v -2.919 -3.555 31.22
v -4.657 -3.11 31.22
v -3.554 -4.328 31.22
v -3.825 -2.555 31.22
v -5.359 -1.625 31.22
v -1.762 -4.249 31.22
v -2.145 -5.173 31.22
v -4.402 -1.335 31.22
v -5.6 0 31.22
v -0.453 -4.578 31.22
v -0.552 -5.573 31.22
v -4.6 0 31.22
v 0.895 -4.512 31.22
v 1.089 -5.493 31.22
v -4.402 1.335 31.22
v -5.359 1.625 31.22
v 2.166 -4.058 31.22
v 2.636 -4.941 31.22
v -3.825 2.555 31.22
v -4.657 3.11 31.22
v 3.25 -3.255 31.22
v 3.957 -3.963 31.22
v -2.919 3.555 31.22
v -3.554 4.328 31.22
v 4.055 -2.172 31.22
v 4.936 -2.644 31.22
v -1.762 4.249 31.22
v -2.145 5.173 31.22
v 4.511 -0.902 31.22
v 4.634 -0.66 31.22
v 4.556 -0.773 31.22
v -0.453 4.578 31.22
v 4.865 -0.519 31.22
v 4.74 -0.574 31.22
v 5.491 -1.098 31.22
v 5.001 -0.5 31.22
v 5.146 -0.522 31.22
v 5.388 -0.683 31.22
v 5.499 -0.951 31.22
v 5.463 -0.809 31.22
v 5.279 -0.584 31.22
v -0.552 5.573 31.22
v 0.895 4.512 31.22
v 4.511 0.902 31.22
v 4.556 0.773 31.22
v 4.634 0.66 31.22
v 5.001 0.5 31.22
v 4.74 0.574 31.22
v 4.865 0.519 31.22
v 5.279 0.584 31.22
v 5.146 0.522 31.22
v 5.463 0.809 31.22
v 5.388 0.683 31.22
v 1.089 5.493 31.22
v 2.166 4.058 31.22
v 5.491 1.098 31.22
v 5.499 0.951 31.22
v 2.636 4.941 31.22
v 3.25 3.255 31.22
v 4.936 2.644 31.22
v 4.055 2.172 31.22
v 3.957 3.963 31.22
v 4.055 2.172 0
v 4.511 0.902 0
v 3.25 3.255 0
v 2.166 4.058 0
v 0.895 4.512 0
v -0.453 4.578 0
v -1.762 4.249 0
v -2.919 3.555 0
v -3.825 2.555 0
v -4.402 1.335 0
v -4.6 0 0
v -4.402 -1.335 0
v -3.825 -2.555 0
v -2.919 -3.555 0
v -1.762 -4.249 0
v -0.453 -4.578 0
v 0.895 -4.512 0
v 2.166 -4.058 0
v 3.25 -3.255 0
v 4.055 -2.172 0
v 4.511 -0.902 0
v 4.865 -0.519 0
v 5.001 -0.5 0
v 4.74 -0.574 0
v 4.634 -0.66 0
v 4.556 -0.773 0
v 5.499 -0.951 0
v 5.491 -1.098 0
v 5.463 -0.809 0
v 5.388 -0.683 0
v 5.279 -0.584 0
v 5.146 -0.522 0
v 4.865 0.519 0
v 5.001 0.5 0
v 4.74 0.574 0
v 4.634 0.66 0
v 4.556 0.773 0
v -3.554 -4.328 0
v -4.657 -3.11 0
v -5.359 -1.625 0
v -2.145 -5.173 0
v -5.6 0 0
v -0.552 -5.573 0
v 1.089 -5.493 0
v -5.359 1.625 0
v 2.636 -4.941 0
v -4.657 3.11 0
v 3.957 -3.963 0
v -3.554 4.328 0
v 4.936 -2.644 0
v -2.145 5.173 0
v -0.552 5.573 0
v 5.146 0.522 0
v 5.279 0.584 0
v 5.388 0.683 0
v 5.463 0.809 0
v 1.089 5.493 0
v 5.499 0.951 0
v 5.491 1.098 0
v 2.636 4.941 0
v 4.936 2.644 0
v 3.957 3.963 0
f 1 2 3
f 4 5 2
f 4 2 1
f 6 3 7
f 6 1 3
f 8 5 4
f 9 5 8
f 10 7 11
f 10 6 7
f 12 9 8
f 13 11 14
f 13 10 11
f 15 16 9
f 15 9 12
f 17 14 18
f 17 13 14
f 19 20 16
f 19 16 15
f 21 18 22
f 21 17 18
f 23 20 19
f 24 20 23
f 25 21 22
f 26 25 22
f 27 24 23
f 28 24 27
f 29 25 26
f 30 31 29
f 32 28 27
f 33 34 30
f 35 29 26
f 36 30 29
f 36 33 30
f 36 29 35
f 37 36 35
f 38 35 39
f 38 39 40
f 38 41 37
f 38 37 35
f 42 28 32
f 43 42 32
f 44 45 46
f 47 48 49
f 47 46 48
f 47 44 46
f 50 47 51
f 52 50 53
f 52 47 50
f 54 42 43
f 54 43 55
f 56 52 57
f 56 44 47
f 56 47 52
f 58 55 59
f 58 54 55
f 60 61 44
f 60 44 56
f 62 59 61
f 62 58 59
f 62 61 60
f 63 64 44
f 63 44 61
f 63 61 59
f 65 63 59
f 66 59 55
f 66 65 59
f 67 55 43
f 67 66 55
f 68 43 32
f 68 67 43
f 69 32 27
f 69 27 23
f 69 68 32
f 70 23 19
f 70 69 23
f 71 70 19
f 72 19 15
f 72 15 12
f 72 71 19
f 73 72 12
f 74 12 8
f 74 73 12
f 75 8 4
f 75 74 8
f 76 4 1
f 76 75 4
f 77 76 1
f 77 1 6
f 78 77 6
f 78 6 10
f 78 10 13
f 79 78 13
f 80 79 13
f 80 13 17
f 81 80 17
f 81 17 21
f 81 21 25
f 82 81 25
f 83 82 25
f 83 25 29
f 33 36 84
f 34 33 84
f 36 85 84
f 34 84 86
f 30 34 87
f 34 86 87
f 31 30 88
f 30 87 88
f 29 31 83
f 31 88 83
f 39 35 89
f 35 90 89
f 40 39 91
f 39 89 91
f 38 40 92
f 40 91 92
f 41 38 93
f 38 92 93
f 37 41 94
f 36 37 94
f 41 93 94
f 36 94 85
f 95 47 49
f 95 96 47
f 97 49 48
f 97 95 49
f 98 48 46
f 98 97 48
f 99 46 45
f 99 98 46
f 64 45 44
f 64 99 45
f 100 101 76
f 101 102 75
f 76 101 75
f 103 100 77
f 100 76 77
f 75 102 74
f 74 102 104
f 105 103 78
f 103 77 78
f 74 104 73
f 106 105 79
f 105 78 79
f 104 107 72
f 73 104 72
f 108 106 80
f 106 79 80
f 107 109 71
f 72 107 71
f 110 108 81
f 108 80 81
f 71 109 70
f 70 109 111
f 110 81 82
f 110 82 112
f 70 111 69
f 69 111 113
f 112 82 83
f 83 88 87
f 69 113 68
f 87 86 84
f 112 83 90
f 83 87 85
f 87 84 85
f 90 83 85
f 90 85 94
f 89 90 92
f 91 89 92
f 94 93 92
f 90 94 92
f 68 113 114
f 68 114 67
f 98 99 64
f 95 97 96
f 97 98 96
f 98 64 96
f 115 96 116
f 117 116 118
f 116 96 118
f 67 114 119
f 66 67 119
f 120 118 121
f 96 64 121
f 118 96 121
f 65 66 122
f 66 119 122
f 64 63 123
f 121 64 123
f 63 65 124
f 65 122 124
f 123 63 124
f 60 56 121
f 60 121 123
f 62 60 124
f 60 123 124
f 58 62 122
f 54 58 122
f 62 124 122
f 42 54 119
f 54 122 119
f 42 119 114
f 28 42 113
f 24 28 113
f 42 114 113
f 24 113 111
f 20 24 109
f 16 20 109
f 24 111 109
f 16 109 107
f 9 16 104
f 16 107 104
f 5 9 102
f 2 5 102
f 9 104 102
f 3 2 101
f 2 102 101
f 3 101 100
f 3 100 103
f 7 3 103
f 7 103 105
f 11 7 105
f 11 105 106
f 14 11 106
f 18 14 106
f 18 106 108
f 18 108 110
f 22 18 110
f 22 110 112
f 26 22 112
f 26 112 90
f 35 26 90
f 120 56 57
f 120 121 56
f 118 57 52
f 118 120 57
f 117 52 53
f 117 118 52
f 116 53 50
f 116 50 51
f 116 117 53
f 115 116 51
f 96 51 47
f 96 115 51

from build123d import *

# Parameters (mm, degrees)
SKETCH_1_R          = 5.6
SKETCH_1_R_2        = 4.6
EXTRUDE_1_DEPTH     = 31.22
SKETCH_2_W          = 4.086350381
SKETCH_2_H          = 1
CUT_EXTRUDE_1_DEPTH = 33.208824878
FILLET_1_R          = 0.5


with BuildPart() as part:
    # 스케치1 → 보스-돌출1 (new body)
    with BuildSketch(Plane.XY):
        Circle(SKETCH_1_R)
        Circle(SKETCH_1_R_2, mode=Mode.SUBTRACT)
    extrude(amount=EXTRUDE_1_DEPTH)

    # 스케치2 → 컷-돌출1 (cut, through all)
    with BuildSketch(Plane.XY):
        with Locations((5.169276946, 0)):
            Rectangle(SKETCH_2_W, SKETCH_2_H)
    extrude(amount=CUT_EXTRUDE_1_DEPTH, mode=Mode.SUBTRACT)

    # 필렛1
    fillet_1_edges = [part.edges().sort_by_distance(p)[0] for p in [
        (4.572745346, -0.5, 15.61),
        (5.577633907, -0.5, 15.61),
        (5.577633907, 0.5, 15.61),
        (4.572745346, 0.5, 15.61),
    ]]
    fillet(fillet_1_edges, radius=FILLET_1_R - 0.0001)  # a hair under: the kernel refuses the full size


solid = part.part
